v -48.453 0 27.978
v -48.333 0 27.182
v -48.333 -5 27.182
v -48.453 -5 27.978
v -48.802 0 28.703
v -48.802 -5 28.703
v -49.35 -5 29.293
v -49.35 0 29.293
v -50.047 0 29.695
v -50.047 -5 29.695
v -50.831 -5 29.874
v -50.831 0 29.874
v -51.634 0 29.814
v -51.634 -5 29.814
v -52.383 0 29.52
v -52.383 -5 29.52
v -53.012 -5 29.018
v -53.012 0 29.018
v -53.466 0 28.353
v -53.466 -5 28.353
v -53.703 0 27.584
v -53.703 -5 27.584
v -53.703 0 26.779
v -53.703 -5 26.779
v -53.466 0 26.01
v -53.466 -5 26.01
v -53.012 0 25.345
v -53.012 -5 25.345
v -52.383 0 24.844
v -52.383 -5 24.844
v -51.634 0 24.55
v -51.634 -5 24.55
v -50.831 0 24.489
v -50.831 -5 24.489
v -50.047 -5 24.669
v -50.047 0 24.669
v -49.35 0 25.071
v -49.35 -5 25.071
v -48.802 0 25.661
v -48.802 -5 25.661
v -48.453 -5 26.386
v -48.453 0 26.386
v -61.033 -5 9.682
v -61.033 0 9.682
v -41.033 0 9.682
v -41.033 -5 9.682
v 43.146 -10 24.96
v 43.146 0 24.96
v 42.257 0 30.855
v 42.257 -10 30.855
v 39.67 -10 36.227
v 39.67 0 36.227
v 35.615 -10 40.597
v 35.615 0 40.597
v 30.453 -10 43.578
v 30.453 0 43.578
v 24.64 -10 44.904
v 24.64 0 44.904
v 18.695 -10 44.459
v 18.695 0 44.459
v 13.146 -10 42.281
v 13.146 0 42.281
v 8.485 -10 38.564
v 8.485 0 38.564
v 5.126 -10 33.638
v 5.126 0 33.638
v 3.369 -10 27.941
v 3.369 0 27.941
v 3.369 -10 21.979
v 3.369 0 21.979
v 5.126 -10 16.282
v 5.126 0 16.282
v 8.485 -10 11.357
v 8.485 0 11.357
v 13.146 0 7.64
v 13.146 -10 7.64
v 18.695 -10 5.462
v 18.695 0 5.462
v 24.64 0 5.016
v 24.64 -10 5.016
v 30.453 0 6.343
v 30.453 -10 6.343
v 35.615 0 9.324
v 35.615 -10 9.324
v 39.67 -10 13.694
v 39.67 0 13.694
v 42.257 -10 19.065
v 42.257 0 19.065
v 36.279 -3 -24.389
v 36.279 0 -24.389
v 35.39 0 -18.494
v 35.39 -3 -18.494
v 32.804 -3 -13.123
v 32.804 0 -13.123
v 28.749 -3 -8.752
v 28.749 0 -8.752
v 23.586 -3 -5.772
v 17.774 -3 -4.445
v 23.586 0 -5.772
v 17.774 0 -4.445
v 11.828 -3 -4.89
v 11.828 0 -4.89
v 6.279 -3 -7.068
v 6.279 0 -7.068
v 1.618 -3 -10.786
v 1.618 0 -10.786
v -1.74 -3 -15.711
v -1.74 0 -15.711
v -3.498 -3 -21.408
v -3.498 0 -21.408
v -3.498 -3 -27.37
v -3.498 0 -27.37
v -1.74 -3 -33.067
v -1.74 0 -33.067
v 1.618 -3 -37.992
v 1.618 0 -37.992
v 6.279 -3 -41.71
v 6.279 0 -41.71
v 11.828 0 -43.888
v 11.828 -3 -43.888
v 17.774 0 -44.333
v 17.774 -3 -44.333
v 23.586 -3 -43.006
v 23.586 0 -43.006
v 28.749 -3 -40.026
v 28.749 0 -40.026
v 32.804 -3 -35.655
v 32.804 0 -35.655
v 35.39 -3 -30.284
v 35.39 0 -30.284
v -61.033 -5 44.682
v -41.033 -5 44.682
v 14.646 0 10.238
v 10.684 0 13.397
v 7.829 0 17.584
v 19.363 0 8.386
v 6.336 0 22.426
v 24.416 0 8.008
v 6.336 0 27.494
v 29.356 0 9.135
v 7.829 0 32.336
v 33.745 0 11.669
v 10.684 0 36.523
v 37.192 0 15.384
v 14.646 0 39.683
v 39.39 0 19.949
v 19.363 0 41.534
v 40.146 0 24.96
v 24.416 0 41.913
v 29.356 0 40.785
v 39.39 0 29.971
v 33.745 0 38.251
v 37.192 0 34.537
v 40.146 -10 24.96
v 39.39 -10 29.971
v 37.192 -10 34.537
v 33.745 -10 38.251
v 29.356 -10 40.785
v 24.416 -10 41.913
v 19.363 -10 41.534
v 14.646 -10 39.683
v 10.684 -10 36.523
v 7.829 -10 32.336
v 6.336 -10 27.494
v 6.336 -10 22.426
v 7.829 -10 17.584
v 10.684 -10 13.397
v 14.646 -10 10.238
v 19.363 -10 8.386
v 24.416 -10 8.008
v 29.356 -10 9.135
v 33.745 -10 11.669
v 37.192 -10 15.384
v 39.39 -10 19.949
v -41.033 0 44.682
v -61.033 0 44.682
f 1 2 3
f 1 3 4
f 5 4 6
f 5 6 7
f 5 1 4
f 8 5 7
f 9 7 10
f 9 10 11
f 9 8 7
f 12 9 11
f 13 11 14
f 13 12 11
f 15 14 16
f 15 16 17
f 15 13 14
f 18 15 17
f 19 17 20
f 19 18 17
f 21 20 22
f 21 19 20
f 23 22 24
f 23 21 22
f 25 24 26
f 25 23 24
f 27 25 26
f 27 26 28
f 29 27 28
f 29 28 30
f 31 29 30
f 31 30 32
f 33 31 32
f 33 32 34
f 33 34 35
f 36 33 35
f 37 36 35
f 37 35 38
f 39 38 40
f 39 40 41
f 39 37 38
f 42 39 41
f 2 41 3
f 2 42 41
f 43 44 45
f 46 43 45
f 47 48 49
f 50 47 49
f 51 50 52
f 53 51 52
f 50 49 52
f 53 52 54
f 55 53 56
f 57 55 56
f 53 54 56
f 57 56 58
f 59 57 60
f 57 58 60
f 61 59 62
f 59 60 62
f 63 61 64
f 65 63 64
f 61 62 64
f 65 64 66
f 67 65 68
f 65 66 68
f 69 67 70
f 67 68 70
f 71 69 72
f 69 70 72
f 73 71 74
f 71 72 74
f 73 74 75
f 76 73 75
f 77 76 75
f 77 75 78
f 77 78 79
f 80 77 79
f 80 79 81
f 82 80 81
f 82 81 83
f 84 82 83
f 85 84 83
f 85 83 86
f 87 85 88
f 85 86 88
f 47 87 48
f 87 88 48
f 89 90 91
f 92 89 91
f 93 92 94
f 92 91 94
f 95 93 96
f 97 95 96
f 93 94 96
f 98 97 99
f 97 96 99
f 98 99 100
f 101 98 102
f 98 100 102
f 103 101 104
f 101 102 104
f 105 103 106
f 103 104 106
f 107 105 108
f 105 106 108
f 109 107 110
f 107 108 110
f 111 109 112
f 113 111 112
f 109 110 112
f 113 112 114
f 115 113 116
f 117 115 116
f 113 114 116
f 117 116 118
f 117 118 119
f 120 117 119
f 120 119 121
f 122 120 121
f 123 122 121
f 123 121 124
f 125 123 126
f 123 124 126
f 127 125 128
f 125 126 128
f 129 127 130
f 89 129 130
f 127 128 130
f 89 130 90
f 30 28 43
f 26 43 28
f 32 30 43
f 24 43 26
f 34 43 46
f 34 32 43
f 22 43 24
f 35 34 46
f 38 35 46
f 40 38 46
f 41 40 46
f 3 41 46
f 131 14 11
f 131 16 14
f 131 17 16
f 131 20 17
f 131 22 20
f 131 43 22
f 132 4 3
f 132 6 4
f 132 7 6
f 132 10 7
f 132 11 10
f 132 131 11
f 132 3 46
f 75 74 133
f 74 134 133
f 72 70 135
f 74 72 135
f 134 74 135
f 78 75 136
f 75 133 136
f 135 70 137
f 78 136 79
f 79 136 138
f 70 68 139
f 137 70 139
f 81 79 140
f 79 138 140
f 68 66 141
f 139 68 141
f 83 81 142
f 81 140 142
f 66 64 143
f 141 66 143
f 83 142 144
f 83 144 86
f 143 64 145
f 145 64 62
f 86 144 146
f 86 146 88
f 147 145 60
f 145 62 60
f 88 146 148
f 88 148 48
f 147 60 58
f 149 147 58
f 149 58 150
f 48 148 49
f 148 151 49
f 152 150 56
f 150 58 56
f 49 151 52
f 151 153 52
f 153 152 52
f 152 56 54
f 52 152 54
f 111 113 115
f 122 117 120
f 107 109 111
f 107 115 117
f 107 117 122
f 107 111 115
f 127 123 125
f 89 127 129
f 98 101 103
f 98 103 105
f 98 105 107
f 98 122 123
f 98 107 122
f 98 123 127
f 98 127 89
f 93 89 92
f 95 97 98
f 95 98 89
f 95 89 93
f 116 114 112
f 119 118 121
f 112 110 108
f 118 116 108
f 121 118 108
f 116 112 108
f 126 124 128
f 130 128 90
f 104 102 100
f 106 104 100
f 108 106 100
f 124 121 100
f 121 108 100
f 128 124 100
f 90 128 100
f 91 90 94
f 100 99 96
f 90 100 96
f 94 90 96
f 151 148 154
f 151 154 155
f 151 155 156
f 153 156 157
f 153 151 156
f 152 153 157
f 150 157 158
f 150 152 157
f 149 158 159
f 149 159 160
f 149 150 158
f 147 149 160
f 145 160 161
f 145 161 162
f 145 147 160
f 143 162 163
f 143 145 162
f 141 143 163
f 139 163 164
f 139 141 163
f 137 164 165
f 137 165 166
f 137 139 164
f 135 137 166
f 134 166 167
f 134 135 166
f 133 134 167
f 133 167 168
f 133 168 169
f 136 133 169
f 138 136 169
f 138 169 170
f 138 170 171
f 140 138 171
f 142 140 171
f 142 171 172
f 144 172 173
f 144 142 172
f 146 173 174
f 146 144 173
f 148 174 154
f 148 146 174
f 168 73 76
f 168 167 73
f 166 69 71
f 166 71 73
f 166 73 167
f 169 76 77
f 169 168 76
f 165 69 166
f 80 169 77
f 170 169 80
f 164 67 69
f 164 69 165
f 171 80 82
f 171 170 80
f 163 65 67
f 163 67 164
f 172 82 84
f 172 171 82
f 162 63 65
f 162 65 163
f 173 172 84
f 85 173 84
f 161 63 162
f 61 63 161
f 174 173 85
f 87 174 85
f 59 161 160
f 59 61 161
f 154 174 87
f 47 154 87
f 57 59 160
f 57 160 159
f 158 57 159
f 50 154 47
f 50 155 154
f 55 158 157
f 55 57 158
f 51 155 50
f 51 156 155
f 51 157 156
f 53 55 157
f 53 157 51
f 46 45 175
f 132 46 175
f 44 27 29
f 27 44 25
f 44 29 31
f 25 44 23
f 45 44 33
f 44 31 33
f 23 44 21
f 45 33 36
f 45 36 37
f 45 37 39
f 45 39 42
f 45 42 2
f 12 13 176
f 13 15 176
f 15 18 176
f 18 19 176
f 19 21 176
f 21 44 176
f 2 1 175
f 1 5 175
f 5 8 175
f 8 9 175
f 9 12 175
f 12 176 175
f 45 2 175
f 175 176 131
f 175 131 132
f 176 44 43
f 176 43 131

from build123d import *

# Parameters (mm, degrees)
F0_W     = 20
F0_H     = 35
F0_R     = 2.7
F1_DEPTH = 5
F2_R     = 20
F2_R_2   = 17
F3_DEPTH = 10
F4_R     = 20
F5_DEPTH = 3


with BuildPart() as f1:
    # F0 (on Front) → F1 (new body)
    with BuildSketch(Plane.XZ):
        with Locations((-51.033057, 27.181904)):
            Rectangle(F0_W, F0_H)
        with Locations((-51.033057, 27.181904)):
            Circle(F0_R, mode=Mode.SUBTRACT)
    extrude(amount=F1_DEPTH)


with BuildPart() as f3:
    # F2 (on Front) → F3 (new body)
    with BuildSketch(Plane.XZ):
        with Locations((23.145685, 24.960145)):
            Circle(F2_R)
        with Locations((23.145685, 24.960145)):
            Circle(F2_R_2, mode=Mode.SUBTRACT)
    extrude(amount=F3_DEPTH)


with BuildPart() as f5:
    # F4 (on Front) → F5 (new body)
    with BuildSketch(Plane.XZ):
        with Locations((16.278917, -24.388995)):
            Circle(F4_R)
    extrude(amount=F5_DEPTH)


solid = Compound([f1.part, f3.part, f5.part])
